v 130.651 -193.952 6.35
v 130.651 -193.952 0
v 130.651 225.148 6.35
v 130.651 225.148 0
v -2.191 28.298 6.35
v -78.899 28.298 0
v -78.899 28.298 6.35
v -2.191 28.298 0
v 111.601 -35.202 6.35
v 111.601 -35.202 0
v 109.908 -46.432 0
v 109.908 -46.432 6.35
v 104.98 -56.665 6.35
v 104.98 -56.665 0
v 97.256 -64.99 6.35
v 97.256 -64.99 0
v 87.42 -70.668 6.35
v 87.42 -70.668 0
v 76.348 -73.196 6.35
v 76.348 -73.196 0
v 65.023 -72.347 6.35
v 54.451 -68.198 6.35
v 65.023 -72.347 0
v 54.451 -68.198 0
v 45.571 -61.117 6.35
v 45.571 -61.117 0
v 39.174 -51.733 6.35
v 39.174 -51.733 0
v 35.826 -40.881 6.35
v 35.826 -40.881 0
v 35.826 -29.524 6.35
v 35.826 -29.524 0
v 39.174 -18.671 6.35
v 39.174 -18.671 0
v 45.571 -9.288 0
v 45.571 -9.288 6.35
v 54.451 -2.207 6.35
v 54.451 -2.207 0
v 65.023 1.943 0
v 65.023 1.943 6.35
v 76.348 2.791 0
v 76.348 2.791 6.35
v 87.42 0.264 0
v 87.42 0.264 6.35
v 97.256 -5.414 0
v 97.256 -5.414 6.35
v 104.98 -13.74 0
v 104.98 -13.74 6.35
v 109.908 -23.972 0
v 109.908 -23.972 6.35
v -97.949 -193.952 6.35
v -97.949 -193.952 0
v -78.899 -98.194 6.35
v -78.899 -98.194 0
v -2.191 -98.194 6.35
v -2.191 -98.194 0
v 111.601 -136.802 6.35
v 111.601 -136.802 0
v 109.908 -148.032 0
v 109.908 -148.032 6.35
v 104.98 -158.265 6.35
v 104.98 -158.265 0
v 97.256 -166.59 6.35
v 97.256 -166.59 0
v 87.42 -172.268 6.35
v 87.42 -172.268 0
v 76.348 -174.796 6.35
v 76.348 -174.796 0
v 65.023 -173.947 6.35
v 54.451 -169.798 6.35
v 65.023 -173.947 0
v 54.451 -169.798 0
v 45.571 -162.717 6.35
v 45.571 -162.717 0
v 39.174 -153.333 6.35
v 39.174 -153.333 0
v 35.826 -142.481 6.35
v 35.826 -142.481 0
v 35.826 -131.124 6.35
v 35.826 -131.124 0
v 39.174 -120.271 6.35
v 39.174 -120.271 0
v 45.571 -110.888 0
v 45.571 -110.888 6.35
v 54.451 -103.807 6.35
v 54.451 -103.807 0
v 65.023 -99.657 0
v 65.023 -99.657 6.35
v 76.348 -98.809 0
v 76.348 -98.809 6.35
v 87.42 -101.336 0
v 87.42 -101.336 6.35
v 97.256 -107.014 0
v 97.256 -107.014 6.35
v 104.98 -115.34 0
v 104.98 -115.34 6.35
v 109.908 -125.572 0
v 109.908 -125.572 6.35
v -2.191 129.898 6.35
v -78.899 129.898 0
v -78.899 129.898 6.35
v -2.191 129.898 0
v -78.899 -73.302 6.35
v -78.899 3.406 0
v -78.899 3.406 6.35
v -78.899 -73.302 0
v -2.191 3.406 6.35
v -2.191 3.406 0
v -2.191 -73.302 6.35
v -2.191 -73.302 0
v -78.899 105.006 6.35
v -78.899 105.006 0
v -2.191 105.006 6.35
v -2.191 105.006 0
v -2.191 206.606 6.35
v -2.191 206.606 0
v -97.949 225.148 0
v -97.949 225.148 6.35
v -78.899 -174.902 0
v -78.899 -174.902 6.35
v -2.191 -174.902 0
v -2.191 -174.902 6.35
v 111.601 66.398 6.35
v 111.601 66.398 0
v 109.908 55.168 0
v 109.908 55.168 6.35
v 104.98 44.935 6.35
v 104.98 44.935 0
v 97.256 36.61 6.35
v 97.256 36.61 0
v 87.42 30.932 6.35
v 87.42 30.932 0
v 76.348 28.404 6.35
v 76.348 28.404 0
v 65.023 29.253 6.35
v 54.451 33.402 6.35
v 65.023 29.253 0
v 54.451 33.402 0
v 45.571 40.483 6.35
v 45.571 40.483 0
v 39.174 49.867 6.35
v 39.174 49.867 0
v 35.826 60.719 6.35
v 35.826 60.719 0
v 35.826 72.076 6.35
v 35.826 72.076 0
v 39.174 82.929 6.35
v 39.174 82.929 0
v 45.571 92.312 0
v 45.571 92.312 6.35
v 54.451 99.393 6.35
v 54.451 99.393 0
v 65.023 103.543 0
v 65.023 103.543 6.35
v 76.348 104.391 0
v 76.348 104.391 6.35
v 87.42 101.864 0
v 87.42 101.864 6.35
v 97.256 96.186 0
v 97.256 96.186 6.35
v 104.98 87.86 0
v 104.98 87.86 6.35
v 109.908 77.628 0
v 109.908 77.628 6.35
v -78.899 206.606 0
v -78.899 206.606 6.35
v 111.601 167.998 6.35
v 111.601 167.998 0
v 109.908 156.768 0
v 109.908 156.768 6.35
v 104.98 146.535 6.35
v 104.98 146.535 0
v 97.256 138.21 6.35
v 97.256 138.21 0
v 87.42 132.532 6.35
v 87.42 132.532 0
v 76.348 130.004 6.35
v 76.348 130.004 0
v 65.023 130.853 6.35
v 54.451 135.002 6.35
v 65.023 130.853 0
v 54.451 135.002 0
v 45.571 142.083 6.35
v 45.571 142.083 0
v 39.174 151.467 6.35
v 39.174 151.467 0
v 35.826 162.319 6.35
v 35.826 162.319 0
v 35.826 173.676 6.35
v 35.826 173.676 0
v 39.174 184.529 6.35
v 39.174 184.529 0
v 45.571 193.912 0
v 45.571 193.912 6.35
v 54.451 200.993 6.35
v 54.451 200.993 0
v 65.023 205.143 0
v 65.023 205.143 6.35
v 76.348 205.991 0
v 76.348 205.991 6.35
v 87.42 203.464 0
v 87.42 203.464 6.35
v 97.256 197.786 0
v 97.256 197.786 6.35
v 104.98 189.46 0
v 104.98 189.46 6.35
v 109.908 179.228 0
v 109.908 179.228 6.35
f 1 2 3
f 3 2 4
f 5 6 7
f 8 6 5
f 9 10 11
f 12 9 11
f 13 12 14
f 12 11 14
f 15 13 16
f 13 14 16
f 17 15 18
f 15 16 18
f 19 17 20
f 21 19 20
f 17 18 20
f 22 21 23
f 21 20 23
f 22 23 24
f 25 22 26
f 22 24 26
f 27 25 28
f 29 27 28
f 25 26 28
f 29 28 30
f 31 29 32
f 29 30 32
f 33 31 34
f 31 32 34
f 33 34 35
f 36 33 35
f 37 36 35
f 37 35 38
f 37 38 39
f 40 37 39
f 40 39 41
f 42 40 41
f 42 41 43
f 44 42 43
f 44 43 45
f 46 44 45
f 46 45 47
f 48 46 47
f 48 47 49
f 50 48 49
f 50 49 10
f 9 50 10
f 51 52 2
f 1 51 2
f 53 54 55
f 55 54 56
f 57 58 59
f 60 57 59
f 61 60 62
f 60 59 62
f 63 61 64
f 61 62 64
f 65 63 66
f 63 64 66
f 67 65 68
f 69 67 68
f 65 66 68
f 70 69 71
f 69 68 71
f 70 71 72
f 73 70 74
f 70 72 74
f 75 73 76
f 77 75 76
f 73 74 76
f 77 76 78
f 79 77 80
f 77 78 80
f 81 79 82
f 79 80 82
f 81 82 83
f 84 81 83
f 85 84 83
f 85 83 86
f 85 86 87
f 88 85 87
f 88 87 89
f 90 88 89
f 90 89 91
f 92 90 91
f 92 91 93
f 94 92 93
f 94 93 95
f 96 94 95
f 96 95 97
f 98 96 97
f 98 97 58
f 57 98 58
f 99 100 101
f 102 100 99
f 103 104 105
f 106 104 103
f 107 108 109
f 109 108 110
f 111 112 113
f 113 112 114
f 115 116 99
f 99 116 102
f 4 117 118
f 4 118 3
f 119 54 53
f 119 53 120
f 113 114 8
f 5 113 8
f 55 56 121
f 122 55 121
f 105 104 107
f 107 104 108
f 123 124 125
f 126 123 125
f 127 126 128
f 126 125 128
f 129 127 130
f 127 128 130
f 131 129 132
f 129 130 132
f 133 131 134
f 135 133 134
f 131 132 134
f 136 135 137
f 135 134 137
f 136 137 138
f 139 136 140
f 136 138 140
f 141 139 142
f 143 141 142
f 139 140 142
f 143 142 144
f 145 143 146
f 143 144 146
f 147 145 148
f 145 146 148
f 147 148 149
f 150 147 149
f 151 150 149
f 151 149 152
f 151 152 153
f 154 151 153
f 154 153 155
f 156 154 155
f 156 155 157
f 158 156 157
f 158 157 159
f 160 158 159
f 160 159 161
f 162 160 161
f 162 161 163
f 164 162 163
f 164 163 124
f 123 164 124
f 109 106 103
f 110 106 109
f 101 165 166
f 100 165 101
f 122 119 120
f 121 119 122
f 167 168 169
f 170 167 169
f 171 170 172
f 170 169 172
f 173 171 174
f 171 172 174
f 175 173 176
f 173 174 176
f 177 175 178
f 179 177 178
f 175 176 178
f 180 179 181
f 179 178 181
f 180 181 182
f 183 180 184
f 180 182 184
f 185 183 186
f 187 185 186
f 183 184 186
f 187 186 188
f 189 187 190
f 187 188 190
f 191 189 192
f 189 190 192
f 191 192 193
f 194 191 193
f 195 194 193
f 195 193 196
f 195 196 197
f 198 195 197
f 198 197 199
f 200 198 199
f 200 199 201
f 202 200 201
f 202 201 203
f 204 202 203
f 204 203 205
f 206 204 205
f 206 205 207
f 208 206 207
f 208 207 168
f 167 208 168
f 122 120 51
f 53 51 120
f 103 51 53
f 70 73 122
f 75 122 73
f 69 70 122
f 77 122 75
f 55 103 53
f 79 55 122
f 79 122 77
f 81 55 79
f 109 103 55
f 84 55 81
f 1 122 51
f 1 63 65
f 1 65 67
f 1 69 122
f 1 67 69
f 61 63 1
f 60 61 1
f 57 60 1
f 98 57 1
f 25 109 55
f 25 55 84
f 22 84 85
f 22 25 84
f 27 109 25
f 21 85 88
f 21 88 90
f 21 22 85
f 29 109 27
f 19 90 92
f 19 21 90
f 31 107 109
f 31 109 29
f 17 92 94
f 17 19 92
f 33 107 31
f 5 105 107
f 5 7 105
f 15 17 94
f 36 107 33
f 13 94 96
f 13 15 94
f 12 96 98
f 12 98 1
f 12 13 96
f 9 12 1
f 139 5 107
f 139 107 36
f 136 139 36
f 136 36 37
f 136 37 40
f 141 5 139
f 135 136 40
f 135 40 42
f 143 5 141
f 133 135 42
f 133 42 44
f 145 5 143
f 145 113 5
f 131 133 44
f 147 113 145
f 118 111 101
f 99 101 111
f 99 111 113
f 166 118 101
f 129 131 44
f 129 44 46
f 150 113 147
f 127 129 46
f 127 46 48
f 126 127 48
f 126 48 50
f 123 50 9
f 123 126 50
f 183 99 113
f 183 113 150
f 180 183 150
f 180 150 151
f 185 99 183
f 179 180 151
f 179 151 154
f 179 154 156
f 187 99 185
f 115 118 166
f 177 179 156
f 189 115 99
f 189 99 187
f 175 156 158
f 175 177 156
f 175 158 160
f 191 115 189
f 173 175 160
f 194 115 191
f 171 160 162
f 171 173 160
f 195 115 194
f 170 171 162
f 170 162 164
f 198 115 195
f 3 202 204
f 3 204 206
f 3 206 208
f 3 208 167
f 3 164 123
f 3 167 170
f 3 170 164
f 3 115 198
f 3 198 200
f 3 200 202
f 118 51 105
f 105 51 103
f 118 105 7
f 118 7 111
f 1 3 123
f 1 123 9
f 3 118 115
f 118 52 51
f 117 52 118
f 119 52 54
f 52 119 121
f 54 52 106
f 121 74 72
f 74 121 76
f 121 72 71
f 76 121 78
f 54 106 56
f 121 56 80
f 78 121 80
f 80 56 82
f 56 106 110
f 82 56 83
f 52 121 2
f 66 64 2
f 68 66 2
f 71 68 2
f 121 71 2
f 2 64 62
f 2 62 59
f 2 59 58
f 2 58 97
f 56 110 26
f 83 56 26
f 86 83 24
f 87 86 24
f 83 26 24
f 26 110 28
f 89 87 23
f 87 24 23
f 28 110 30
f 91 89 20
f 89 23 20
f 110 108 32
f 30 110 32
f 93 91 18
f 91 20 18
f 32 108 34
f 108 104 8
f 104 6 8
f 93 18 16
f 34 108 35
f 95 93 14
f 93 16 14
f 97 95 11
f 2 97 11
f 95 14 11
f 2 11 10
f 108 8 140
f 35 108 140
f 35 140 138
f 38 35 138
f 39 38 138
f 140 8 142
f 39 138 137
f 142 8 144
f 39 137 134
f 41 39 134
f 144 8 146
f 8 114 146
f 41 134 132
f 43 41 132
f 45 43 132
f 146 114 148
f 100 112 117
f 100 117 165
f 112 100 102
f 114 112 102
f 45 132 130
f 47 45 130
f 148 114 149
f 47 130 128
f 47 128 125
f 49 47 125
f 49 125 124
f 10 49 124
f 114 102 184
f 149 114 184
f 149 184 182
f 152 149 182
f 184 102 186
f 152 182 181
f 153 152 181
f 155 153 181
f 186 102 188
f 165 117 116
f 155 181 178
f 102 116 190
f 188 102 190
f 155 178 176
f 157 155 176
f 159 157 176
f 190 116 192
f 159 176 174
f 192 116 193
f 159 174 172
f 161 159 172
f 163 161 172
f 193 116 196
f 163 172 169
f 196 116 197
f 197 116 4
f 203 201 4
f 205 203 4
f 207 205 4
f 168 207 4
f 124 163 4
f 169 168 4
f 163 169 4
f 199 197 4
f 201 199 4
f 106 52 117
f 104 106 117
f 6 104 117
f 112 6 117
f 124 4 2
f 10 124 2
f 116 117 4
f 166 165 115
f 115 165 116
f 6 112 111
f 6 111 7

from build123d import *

# Parameters (mm, degrees)
F0_W     = 228.6
F0_H     = 419.1
F1_DEPTH = 6.35
F2_W     = 76.708
F2_H     = 76.708
F3_DEPTH = 25.4
F4_R     = 38.1
F5_DEPTH = 25.4


with BuildPart() as f1:
    # F0 (on Top) → F1 (new body)
    with BuildSketch(Plane.XY):
        with Locations((16.350647, 15.597903)):
            Rectangle(F0_W, F0_H)
    extrude(amount=F1_DEPTH)

    # F2 (on face) → F3 (cut)
    with BuildSketch(Plane(origin=(0, 0, 0), x_dir=(1, 0, 0), z_dir=(0, 0, -1))):
        with Locations((-40.545353, 136.548097)):
            Rectangle(F2_W, F2_H)
        with Locations((-40.545353, 34.948097)):
            Rectangle(F2_W, F2_H)
        with Locations((-40.545353, -66.651903)):
            Rectangle(F2_W, F2_H)
        with Locations((-40.545353, -168.251903)):
            Rectangle(F2_W, F2_H)
    extrude(amount=-F3_DEPTH, mode=Mode.SUBTRACT)

    # F4 (on face) → F5 (cut)
    with BuildSketch(Plane(origin=(0, 0, 0), x_dir=(1, 0, 0), z_dir=(0, 0, -1))):
        with Locations((73.500647, 136.802097)):
            Circle(F4_R)
        with Locations((73.500647, 35.202097)):
            Circle(F4_R)
        with Locations((73.500647, -66.397903)):
            Circle(F4_R)
        with Locations((73.500647, -167.997903)):
            Circle(F4_R)
    extrude(amount=-F5_DEPTH, mode=Mode.SUBTRACT)


solid = f1.part
